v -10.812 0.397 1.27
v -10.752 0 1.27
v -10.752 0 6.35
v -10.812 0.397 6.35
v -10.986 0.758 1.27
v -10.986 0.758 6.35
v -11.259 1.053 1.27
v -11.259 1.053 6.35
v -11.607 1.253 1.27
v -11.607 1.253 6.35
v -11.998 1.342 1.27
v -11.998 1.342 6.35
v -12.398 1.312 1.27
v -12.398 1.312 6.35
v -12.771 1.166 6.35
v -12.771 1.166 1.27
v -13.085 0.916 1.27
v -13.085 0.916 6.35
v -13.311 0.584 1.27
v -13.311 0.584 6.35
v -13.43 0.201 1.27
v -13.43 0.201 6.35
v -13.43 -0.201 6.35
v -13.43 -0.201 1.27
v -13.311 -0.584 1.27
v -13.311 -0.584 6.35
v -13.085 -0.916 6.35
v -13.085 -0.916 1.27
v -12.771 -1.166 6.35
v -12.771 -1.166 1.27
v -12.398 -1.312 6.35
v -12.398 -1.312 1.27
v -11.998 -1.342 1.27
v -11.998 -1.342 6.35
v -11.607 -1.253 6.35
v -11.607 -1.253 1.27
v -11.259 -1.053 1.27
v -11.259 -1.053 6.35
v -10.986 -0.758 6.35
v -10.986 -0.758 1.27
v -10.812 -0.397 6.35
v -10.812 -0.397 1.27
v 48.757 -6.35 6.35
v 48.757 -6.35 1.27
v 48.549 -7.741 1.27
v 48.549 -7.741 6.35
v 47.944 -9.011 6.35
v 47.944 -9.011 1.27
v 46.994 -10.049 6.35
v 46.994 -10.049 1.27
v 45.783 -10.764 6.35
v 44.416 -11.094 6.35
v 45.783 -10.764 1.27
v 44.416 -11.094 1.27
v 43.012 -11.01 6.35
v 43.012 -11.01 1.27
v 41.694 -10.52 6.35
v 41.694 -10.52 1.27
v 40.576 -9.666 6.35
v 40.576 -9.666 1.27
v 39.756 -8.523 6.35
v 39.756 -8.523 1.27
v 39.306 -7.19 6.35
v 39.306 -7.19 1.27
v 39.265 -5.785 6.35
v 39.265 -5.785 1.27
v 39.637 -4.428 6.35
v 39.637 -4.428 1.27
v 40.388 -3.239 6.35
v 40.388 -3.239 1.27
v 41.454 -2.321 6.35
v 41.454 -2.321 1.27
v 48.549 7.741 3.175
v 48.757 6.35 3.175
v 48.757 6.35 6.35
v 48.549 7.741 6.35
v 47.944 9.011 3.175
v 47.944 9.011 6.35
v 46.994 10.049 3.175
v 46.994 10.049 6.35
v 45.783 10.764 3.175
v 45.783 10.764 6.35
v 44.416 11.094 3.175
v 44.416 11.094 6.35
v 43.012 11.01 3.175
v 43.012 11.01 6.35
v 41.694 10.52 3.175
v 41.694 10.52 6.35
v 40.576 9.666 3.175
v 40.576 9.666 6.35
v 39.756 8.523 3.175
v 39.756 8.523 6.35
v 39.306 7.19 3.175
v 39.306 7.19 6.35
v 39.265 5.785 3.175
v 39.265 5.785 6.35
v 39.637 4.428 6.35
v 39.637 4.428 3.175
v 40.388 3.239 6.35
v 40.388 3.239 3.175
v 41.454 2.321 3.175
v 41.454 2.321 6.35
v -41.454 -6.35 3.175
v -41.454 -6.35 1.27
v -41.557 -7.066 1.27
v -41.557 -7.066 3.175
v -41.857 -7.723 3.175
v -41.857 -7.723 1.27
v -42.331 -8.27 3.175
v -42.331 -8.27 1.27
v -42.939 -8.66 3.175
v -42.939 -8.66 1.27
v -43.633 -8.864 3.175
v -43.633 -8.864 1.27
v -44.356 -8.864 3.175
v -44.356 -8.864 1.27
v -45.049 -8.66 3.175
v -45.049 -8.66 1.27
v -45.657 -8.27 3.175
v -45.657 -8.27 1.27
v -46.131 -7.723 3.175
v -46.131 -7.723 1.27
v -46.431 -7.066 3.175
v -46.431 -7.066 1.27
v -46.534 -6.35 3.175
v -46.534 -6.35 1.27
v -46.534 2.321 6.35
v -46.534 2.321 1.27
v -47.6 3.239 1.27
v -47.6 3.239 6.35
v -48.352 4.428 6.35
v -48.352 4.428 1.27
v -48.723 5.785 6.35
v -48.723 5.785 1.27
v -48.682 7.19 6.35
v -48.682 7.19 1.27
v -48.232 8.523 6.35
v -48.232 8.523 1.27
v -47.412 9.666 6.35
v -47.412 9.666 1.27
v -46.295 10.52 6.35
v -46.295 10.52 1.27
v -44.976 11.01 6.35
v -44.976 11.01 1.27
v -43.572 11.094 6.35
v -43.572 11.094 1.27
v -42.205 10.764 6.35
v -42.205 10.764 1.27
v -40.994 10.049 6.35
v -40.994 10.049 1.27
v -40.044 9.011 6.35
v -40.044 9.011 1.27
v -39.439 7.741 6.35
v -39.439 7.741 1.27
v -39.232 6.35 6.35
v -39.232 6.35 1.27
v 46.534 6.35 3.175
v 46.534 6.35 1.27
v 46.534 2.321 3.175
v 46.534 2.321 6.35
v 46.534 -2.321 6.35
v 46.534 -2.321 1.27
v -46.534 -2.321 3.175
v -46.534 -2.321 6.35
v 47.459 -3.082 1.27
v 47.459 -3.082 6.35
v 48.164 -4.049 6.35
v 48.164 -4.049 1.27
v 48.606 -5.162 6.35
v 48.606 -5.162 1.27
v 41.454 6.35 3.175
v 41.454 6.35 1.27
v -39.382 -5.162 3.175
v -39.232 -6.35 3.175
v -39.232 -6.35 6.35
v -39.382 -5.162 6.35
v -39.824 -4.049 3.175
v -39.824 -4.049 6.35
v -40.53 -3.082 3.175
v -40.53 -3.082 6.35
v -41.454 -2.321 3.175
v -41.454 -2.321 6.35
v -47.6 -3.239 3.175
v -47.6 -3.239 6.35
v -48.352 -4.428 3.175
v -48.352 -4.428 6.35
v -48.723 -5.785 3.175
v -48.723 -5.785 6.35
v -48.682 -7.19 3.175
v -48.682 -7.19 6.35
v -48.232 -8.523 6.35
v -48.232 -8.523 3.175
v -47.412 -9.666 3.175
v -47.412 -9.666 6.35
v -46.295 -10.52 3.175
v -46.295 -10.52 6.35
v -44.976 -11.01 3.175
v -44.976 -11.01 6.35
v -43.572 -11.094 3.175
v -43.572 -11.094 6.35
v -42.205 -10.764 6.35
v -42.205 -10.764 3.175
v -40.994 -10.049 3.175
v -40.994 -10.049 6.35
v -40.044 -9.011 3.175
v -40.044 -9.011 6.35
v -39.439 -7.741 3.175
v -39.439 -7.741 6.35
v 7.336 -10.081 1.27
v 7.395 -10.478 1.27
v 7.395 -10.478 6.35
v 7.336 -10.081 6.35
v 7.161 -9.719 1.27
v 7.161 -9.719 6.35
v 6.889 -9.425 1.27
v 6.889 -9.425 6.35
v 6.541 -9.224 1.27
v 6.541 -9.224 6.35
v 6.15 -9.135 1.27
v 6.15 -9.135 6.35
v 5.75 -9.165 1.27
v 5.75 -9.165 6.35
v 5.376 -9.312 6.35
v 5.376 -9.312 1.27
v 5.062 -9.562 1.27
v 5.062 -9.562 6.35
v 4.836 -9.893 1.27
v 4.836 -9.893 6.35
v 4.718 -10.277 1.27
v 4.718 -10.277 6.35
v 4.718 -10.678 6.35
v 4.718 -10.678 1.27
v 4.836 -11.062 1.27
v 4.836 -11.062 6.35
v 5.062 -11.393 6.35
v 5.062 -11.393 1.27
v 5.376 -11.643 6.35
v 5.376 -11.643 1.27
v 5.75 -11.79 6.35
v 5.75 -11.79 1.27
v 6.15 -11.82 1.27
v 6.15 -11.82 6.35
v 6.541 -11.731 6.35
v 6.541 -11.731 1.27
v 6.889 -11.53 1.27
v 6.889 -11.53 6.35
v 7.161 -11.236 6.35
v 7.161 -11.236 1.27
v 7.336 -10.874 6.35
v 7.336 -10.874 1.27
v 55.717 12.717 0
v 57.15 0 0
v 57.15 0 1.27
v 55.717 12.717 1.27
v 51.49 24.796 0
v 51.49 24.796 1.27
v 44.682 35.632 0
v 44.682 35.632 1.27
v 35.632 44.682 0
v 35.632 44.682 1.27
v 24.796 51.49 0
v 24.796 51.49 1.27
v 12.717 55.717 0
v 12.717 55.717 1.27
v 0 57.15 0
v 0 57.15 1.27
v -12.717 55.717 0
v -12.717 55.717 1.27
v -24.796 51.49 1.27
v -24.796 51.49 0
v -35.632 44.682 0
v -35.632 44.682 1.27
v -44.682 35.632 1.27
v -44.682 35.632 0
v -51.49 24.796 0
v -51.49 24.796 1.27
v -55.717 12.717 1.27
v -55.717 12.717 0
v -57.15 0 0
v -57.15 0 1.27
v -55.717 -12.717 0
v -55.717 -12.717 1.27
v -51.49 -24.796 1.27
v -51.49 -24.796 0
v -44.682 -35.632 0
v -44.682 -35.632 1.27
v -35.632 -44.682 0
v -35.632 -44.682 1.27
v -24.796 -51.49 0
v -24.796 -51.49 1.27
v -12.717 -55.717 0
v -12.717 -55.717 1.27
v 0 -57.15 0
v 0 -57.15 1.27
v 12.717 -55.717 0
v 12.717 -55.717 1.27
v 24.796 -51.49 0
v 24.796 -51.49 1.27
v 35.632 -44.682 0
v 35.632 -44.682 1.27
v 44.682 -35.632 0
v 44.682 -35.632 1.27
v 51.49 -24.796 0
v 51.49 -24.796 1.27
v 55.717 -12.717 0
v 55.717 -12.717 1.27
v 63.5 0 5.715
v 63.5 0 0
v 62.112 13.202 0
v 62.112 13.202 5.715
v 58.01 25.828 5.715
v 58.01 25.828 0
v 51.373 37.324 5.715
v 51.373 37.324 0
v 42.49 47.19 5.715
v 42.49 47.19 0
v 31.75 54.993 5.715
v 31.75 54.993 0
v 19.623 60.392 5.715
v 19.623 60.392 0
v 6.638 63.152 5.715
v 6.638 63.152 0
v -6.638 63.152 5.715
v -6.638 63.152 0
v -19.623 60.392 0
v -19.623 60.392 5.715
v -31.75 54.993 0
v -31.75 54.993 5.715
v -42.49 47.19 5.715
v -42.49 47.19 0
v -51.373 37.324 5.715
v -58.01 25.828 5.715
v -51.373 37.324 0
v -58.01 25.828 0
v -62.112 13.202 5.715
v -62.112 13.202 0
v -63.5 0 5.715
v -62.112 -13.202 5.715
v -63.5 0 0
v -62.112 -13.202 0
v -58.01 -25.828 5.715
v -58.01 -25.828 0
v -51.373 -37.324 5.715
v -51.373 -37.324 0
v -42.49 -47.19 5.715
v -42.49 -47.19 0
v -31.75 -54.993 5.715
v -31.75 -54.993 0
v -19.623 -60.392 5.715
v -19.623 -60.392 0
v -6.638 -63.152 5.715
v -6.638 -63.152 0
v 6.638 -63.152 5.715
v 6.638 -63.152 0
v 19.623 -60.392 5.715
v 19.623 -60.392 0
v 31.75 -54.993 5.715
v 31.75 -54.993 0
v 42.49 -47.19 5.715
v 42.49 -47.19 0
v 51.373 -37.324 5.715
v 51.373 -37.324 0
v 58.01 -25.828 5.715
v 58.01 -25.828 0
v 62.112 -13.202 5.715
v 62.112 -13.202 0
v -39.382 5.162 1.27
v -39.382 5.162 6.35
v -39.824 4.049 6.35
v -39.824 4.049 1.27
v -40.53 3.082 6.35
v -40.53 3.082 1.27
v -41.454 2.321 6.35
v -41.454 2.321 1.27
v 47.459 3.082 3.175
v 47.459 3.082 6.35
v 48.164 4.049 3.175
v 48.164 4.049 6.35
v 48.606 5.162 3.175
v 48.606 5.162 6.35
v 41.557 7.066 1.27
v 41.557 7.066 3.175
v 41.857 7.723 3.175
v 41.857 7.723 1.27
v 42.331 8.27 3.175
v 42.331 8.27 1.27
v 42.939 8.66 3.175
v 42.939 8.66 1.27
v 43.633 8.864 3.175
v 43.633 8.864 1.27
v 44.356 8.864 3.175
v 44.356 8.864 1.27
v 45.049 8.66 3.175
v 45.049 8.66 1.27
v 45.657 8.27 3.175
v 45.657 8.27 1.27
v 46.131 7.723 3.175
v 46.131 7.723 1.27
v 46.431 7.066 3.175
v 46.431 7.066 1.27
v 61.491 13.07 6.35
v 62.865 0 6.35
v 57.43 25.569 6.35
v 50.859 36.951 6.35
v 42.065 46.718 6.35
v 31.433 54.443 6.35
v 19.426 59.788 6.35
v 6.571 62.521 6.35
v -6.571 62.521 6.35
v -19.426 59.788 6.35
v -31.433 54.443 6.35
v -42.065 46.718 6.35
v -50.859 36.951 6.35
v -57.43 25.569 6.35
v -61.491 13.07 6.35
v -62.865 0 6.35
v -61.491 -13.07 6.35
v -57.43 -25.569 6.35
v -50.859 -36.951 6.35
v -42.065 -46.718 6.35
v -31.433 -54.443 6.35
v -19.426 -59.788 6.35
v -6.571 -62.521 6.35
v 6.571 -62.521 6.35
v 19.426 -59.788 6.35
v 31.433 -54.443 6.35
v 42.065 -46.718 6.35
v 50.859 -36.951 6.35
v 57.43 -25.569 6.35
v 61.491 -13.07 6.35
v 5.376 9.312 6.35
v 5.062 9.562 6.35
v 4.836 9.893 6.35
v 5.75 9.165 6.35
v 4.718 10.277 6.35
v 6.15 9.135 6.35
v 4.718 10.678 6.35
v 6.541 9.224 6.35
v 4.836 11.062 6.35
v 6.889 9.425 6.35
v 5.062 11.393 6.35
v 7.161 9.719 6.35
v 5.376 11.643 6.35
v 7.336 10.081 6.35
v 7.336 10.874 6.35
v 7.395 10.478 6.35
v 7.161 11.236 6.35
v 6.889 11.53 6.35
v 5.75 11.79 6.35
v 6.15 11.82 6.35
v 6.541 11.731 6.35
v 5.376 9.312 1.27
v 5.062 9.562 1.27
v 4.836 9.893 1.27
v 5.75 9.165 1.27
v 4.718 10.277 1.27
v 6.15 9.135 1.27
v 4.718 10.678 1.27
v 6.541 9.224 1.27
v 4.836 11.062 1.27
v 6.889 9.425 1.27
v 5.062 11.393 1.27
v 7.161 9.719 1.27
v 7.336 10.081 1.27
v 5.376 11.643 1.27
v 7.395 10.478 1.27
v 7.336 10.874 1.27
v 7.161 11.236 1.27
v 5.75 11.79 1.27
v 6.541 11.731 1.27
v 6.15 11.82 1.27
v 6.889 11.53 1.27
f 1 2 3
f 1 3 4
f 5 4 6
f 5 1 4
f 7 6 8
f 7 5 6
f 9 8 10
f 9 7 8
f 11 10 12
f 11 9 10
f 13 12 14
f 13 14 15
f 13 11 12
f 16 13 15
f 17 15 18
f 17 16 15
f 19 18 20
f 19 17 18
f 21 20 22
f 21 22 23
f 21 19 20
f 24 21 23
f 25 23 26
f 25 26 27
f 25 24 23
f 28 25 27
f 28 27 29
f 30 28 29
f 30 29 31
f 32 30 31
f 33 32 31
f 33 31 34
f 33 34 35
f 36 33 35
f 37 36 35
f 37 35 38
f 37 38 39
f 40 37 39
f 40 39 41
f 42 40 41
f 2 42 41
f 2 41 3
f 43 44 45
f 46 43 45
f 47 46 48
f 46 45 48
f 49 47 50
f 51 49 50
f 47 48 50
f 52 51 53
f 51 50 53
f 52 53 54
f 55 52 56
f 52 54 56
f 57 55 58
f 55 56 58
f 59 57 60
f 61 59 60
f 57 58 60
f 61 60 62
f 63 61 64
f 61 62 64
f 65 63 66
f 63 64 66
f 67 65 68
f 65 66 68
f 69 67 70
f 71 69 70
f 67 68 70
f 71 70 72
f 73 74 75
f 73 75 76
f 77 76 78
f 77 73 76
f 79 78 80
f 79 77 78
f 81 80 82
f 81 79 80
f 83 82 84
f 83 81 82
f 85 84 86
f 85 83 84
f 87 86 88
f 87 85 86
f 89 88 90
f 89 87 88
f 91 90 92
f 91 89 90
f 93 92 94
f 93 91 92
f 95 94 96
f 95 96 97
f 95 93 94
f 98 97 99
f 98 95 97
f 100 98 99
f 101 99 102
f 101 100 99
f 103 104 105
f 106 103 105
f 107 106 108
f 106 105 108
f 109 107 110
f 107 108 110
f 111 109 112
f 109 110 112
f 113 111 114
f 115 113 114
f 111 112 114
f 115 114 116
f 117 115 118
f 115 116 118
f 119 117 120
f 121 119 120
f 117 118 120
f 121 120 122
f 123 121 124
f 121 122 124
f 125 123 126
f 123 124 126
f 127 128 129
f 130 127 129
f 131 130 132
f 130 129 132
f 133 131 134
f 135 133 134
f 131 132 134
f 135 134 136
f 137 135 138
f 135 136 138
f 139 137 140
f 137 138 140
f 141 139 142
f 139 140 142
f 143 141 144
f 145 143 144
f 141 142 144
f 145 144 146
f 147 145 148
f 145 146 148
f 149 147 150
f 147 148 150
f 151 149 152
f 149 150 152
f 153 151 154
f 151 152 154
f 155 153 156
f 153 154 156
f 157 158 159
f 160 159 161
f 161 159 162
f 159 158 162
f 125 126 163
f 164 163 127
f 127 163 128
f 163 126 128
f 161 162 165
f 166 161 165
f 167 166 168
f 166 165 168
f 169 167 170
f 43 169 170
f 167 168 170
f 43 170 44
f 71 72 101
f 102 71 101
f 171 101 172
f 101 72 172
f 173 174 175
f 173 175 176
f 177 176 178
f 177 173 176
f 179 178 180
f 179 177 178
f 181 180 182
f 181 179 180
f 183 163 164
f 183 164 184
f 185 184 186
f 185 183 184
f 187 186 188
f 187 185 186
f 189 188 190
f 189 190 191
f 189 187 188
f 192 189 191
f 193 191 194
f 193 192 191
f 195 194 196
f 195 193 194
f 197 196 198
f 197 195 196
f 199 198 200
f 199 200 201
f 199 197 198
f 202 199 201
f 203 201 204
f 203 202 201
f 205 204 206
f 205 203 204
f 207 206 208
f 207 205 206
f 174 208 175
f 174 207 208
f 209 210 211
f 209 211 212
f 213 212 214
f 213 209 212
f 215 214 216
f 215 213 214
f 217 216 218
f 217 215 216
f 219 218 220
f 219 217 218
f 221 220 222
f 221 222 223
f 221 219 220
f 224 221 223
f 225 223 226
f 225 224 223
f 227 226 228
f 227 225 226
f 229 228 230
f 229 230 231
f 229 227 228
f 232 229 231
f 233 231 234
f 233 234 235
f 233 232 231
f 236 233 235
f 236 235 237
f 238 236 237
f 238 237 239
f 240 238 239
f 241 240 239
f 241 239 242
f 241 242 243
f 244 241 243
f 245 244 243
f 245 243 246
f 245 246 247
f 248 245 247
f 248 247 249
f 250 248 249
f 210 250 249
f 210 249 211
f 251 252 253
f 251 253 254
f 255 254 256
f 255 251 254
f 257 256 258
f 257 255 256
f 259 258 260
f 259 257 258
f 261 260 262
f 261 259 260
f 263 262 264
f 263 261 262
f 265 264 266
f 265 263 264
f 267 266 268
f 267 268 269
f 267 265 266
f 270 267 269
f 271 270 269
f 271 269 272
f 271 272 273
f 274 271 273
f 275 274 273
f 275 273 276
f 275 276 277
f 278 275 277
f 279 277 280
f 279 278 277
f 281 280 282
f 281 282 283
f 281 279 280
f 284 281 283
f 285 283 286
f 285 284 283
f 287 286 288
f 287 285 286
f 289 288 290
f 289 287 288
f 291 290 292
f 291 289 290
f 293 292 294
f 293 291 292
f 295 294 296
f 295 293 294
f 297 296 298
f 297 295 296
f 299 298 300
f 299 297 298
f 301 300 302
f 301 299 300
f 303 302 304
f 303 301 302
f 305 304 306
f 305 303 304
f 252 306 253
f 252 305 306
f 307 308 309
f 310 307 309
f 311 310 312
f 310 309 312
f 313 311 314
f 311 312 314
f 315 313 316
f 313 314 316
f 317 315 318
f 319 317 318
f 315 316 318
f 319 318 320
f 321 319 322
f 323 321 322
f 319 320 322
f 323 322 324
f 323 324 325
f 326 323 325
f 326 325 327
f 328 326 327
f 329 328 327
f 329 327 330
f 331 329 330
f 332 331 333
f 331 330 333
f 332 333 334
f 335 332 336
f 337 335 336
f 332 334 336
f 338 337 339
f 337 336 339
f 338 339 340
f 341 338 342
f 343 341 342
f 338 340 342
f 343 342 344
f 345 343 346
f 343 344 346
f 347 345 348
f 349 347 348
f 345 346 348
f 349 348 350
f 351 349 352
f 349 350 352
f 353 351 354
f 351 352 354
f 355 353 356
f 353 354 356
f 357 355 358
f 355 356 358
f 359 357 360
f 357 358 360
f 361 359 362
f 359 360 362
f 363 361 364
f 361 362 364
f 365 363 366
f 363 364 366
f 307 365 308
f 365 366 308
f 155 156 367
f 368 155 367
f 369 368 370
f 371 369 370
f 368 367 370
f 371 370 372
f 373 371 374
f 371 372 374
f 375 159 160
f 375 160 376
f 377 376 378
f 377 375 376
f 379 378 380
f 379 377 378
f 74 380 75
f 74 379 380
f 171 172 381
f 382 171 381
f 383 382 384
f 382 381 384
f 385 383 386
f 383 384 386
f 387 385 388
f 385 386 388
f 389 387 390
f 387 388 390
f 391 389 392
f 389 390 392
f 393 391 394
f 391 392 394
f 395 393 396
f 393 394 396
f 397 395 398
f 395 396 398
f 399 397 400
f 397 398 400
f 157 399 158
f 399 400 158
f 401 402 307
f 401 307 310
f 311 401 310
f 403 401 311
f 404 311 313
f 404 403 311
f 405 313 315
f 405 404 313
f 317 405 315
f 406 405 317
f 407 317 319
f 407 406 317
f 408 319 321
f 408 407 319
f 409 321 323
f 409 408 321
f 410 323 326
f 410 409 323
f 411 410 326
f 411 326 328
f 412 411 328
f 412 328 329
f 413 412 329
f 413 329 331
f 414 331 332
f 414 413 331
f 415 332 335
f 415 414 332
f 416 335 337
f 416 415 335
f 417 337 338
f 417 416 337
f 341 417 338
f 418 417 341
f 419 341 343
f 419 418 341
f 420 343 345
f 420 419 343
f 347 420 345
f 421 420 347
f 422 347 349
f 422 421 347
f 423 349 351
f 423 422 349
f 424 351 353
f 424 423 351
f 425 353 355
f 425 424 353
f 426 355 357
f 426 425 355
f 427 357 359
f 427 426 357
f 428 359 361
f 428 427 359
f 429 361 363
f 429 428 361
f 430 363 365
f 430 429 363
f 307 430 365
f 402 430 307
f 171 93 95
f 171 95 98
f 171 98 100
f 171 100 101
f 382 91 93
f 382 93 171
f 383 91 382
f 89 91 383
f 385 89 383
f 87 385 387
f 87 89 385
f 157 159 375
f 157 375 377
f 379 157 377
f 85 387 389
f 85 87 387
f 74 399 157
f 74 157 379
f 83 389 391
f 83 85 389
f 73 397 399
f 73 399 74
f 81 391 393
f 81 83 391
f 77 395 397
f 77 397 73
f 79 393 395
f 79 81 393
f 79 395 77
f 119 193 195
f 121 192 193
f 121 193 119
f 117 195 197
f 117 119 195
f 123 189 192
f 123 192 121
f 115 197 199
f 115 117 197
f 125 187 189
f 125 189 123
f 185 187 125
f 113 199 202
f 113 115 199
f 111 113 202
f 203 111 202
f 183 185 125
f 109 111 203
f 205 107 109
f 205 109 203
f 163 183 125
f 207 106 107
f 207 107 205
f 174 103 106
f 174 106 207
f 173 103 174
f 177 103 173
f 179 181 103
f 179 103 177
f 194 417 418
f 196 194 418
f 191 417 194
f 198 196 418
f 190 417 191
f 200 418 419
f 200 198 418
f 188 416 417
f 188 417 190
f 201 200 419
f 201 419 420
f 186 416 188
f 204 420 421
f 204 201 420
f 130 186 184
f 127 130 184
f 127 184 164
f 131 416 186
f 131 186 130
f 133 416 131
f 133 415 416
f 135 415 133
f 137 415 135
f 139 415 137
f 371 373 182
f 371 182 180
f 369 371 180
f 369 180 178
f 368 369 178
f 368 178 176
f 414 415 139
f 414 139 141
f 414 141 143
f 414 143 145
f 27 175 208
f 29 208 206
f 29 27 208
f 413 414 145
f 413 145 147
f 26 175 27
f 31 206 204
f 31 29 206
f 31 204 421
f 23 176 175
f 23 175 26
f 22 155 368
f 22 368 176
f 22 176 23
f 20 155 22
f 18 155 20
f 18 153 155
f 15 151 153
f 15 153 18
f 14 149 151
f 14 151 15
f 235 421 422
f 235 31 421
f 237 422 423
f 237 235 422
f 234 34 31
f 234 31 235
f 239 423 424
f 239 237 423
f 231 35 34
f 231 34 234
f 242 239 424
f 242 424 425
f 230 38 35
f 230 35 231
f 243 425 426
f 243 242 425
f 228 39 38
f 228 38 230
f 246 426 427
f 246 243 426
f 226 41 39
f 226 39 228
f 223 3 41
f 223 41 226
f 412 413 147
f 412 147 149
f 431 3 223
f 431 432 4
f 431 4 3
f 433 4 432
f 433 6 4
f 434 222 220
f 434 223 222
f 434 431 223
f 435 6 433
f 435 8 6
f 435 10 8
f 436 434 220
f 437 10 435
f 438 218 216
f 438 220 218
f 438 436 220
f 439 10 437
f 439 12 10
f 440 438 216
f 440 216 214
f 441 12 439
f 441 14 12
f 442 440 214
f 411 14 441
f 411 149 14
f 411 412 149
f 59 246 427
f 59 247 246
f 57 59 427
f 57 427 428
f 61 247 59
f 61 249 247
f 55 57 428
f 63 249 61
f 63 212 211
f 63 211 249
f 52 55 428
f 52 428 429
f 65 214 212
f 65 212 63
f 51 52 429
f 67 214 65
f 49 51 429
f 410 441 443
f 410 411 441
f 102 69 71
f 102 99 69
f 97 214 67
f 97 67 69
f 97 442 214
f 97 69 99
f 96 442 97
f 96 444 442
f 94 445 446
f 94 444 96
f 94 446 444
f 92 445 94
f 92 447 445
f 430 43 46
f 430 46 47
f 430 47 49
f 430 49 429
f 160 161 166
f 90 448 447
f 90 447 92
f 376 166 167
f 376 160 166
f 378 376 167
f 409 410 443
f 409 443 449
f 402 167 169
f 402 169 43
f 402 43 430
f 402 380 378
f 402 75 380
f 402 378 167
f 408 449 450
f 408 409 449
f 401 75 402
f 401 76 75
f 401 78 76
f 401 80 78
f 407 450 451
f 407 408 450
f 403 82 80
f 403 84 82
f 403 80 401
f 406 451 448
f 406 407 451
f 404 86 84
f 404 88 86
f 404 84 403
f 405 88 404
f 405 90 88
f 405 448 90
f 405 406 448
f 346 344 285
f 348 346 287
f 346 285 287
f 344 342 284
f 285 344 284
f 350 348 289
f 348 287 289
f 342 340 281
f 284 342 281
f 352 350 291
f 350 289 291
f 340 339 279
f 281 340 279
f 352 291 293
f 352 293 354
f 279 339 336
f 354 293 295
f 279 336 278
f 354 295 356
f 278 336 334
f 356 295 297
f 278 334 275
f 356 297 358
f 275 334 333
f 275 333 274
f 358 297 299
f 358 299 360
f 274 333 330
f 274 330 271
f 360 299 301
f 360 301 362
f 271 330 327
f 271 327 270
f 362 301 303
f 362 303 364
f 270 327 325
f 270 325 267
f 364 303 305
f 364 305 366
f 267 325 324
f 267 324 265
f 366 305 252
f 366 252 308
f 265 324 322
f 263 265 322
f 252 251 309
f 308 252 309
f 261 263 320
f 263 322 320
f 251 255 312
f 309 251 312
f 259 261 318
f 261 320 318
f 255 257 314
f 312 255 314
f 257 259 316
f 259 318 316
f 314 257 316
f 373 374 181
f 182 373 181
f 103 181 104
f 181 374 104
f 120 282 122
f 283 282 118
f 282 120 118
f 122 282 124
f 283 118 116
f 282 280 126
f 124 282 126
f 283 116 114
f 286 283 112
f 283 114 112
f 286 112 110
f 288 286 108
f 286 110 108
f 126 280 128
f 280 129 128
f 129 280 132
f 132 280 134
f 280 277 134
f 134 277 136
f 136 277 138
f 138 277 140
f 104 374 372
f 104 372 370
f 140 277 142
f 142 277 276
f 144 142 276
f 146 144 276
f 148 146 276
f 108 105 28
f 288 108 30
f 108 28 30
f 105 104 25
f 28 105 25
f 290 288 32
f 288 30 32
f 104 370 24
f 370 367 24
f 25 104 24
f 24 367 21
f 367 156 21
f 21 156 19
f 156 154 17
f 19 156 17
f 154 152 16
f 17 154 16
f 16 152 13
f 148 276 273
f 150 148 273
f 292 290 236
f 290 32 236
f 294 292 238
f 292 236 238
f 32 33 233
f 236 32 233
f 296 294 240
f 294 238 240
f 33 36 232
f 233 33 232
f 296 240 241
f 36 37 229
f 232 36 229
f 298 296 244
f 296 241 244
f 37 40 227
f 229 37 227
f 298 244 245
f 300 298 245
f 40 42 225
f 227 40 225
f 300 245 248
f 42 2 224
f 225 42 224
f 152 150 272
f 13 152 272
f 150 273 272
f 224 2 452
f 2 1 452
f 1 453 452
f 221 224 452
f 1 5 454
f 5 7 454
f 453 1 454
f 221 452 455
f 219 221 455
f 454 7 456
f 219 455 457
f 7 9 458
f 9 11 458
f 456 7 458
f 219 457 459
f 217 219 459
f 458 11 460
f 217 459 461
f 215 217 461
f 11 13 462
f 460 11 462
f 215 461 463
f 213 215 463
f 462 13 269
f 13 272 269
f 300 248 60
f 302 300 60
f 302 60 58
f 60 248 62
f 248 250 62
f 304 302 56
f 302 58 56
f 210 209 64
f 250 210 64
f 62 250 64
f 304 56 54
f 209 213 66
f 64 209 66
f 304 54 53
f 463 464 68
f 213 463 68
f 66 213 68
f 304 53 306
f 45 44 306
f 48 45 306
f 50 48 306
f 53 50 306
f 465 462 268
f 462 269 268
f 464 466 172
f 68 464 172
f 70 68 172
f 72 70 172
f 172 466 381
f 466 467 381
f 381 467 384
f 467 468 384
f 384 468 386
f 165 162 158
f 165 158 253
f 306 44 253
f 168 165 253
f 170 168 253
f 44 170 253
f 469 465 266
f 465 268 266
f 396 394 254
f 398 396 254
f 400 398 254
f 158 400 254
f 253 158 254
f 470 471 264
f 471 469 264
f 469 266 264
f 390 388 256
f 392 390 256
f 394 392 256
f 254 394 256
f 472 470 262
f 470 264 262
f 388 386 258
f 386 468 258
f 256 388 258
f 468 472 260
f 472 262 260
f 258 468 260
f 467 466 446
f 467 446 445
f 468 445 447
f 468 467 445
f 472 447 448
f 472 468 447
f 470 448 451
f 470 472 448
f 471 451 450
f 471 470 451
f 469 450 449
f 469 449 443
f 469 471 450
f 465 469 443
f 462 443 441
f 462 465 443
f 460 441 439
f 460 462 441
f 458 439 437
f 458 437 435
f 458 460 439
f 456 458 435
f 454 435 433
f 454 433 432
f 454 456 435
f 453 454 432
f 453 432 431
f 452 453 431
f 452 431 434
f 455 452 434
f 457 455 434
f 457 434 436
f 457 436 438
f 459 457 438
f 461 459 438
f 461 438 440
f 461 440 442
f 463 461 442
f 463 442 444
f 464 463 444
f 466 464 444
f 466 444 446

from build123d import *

# Parameters (mm, degrees)
F0_R     = 63.5
F0_R_2   = 57.15
F0_R_3   = 1.3462
F1_DEPTH = 6.35
F2_START = 3.175
F2_DEPTH = 3.175
F3_SIZE  = 0.635
F4_DEPTH = 1.27


with BuildPart() as f1:
    # F0 (on Top) → F1 (new body)
    with BuildSketch(Plane.XY):
        Circle(F0_R)
        Circle(F0_R_2, mode=Mode.SUBTRACT)
        Circle(F0_R_2)
        with Locations((6.0491874454, -10.4775)):
            Circle(F0_R_3, mode=Mode.SUBTRACT)
        with BuildLine():
            ThreePointArc((-41.4540905122, -2.3213766309), (-39.8240691544, -4.0494939415), (-39.2315905122, -6.35))
            ThreePointArc((-39.2315905122, -6.35), (-46.2945965707, -10.5200213579), (-46.5340905122, -2.3213766309))
            Line((-46.5340905122, -2.3213766309), (-46.5340905122, 2.3213766309))
            ThreePointArc((-46.5340905122, 2.3213766309), (-46.2945965707, 10.5200213579), (-39.2315905122, 6.35))
            ThreePointArc((-39.2315905122, 6.35), (-39.8240691544, 4.0494939415), (-41.4540905122, 2.3213766309))
            Line((-41.4540905122, 2.3213766309), (-41.4540905122, -2.3213766309))
        make_face(mode=Mode.SUBTRACT)
        with Locations((-12.0983748909, 0)):
            Circle(F0_R_3, mode=Mode.SUBTRACT)
        with Locations((6.0491874454, 10.4775)):
            Circle(F0_R_3, mode=Mode.SUBTRACT)
        with BuildLine():
            ThreePointArc((48.7565905122, 6.35), (48.1641118701, 4.0494939415), (46.5340905122, 2.3213766309))
            Line((46.5340905122, 2.3213766309), (46.5340905122, -2.3213766309))
            ThreePointArc((46.5340905122, -2.3213766309), (48.1641118701, -4.0494939415), (48.7565905122, -6.35))
            ThreePointArc((48.7565905122, -6.35), (41.6935844538, -10.5200213579), (41.4540905122, -2.3213766309))
            Line((41.4540905122, -2.3213766309), (41.4540905122, 2.3213766309))
            ThreePointArc((41.4540905122, 2.3213766309), (41.6935844538, 10.5200213579), (48.7565905122, 6.35))
        make_face(mode=Mode.SUBTRACT)
        with BuildLine():
            ThreePointArc((-46.5340905122, -2.3213766309), (-46.2945965707, -10.5200213579), (-39.2315905122, -6.35))
            ThreePointArc((-39.2315905122, -6.35), (-39.8240691544, -4.0494939415), (-41.4540905122, -2.3213766309))
            Line((-41.4540905122, -2.3213766309), (-41.4540905122, -6.35))
            ThreePointArc((-41.4540905122, -6.35), (-43.9940905122, -8.89), (-46.5340905122, -6.35))
            Line((-46.5340905122, -6.35), (-46.5340905122, -2.3213766309))
        make_face()
        with BuildLine():
            ThreePointArc((41.4540905122, 6.35), (43.9940905122, 8.89), (46.5340905122, 6.35))
            Line((46.5340905122, 6.35), (46.5340905122, 2.3213766309))
            ThreePointArc((46.5340905122, 2.3213766309), (48.1641118701, 4.0494939415), (48.7565905122, 6.35))
            ThreePointArc((48.7565905122, 6.35), (41.6935844538, 10.5200213579), (41.4540905122, 2.3213766309))
            Line((41.4540905122, 2.3213766309), (41.4540905122, 6.35))
        make_face()
    extrude(amount=F1_DEPTH)

    # F0 (on Top) → F2 (cut)
    with BuildSketch(Plane.XY.offset(F2_START)):
        with BuildLine():
            ThreePointArc((-46.5340905122, -2.3213766309), (-46.2945965707, -10.5200213579), (-39.2315905122, -6.35))
            ThreePointArc((-39.2315905122, -6.35), (-39.8240691544, -4.0494939415), (-41.4540905122, -2.3213766309))
            Line((-41.4540905122, -2.3213766309), (-41.4540905122, -6.35))
            ThreePointArc((-41.4540905122, -6.35), (-43.9940905122, -8.89), (-46.5340905122, -6.35))
            Line((-46.5340905122, -6.35), (-46.5340905122, -2.3213766309))
        make_face()
        with BuildLine():
            Line((-41.4540905122, -6.35), (-41.4540905122, -2.3213766309))
            ThreePointArc((-41.4540905122, -2.3213766309), (-43.9940905122, -1.5875), (-46.5340905122, -2.3213766309))
            Line((-46.5340905122, -2.3213766309), (-46.5340905122, -6.35))
            ThreePointArc((-46.5340905122, -6.35), (-43.9940905122, -3.81), (-41.4540905122, -6.35))
        make_face()
        with BuildLine():
            Line((46.5340905122, 2.3213766309), (46.5340905122, 6.35))
            ThreePointArc((46.5340905122, 6.35), (43.9940905122, 3.81), (41.4540905122, 6.35))
            Line((41.4540905122, 6.35), (41.4540905122, 2.3213766309))
            ThreePointArc((41.4540905122, 2.3213766309), (43.9940905122, 1.5875), (46.5340905122, 2.3213766309))
        make_face()
        with BuildLine():
            ThreePointArc((41.4540905122, 6.35), (43.9940905122, 8.89), (46.5340905122, 6.35))
            Line((46.5340905122, 6.35), (46.5340905122, 2.3213766309))
            ThreePointArc((46.5340905122, 2.3213766309), (48.1641118701, 4.0494939415), (48.7565905122, 6.35))
            ThreePointArc((48.7565905122, 6.35), (41.6935844538, 10.5200213579), (41.4540905122, 2.3213766309))
            Line((41.4540905122, 2.3213766309), (41.4540905122, 6.35))
        make_face()
    extrude(amount=F2_DEPTH, mode=Mode.SUBTRACT)

    # F3
    f3_edges = [f1.edges().sort_by_distance(p)[0] for p in [
        (-63.5, 0, 6.35),
    ]]
    chamfer(f3_edges, length=F3_SIZE)

    # F0 (on Top) → F4 (cut)
    with BuildSketch(Plane.XY):
        Circle(F0_R_2)
        with Locations((6.0491874454, -10.4775)):
            Circle(F0_R_3, mode=Mode.SUBTRACT)
        with BuildLine():
            ThreePointArc((-41.4540905122, -2.3213766309), (-39.8240691544, -4.0494939415), (-39.2315905122, -6.35))
            ThreePointArc((-39.2315905122, -6.35), (-46.2945965707, -10.5200213579), (-46.5340905122, -2.3213766309))
            Line((-46.5340905122, -2.3213766309), (-46.5340905122, 2.3213766309))
            ThreePointArc((-46.5340905122, 2.3213766309), (-46.2945965707, 10.5200213579), (-39.2315905122, 6.35))
            ThreePointArc((-39.2315905122, 6.35), (-39.8240691544, 4.0494939415), (-41.4540905122, 2.3213766309))
            Line((-41.4540905122, 2.3213766309), (-41.4540905122, -2.3213766309))
        make_face(mode=Mode.SUBTRACT)
        with Locations((-12.0983748909, 0)):
            Circle(F0_R_3, mode=Mode.SUBTRACT)
        with Locations((6.0491874454, 10.4775)):
            Circle(F0_R_3, mode=Mode.SUBTRACT)
        with BuildLine():
            ThreePointArc((48.7565905122, 6.35), (48.1641118701, 4.0494939415), (46.5340905122, 2.3213766309))
            Line((46.5340905122, 2.3213766309), (46.5340905122, -2.3213766309))
            ThreePointArc((46.5340905122, -2.3213766309), (48.1641118701, -4.0494939415), (48.7565905122, -6.35))
            ThreePointArc((48.7565905122, -6.35), (41.6935844538, -10.5200213579), (41.4540905122, -2.3213766309))
            Line((41.4540905122, -2.3213766309), (41.4540905122, 2.3213766309))
            ThreePointArc((41.4540905122, 2.3213766309), (41.6935844538, 10.5200213579), (48.7565905122, 6.35))
        make_face(mode=Mode.SUBTRACT)
        with BuildLine():
            ThreePointArc((-46.5340905122, -2.3213766309), (-46.2945965707, -10.5200213579), (-39.2315905122, -6.35))
            ThreePointArc((-39.2315905122, -6.35), (-39.8240691544, -4.0494939415), (-41.4540905122, -2.3213766309))
            Line((-41.4540905122, -2.3213766309), (-41.4540905122, -6.35))
            ThreePointArc((-41.4540905122, -6.35), (-43.9940905122, -8.89), (-46.5340905122, -6.35))
            Line((-46.5340905122, -6.35), (-46.5340905122, -2.3213766309))
        make_face()
        with BuildLine():
            ThreePointArc((41.4540905122, 6.35), (43.9940905122, 8.89), (46.5340905122, 6.35))
            Line((46.5340905122, 6.35), (46.5340905122, 2.3213766309))
            ThreePointArc((46.5340905122, 2.3213766309), (48.1641118701, 4.0494939415), (48.7565905122, 6.35))
            ThreePointArc((48.7565905122, 6.35), (41.6935844538, 10.5200213579), (41.4540905122, 2.3213766309))
            Line((41.4540905122, 2.3213766309), (41.4540905122, 6.35))
        make_face()
    extrude(amount=F4_DEPTH, mode=Mode.SUBTRACT)


solid = f1.part
